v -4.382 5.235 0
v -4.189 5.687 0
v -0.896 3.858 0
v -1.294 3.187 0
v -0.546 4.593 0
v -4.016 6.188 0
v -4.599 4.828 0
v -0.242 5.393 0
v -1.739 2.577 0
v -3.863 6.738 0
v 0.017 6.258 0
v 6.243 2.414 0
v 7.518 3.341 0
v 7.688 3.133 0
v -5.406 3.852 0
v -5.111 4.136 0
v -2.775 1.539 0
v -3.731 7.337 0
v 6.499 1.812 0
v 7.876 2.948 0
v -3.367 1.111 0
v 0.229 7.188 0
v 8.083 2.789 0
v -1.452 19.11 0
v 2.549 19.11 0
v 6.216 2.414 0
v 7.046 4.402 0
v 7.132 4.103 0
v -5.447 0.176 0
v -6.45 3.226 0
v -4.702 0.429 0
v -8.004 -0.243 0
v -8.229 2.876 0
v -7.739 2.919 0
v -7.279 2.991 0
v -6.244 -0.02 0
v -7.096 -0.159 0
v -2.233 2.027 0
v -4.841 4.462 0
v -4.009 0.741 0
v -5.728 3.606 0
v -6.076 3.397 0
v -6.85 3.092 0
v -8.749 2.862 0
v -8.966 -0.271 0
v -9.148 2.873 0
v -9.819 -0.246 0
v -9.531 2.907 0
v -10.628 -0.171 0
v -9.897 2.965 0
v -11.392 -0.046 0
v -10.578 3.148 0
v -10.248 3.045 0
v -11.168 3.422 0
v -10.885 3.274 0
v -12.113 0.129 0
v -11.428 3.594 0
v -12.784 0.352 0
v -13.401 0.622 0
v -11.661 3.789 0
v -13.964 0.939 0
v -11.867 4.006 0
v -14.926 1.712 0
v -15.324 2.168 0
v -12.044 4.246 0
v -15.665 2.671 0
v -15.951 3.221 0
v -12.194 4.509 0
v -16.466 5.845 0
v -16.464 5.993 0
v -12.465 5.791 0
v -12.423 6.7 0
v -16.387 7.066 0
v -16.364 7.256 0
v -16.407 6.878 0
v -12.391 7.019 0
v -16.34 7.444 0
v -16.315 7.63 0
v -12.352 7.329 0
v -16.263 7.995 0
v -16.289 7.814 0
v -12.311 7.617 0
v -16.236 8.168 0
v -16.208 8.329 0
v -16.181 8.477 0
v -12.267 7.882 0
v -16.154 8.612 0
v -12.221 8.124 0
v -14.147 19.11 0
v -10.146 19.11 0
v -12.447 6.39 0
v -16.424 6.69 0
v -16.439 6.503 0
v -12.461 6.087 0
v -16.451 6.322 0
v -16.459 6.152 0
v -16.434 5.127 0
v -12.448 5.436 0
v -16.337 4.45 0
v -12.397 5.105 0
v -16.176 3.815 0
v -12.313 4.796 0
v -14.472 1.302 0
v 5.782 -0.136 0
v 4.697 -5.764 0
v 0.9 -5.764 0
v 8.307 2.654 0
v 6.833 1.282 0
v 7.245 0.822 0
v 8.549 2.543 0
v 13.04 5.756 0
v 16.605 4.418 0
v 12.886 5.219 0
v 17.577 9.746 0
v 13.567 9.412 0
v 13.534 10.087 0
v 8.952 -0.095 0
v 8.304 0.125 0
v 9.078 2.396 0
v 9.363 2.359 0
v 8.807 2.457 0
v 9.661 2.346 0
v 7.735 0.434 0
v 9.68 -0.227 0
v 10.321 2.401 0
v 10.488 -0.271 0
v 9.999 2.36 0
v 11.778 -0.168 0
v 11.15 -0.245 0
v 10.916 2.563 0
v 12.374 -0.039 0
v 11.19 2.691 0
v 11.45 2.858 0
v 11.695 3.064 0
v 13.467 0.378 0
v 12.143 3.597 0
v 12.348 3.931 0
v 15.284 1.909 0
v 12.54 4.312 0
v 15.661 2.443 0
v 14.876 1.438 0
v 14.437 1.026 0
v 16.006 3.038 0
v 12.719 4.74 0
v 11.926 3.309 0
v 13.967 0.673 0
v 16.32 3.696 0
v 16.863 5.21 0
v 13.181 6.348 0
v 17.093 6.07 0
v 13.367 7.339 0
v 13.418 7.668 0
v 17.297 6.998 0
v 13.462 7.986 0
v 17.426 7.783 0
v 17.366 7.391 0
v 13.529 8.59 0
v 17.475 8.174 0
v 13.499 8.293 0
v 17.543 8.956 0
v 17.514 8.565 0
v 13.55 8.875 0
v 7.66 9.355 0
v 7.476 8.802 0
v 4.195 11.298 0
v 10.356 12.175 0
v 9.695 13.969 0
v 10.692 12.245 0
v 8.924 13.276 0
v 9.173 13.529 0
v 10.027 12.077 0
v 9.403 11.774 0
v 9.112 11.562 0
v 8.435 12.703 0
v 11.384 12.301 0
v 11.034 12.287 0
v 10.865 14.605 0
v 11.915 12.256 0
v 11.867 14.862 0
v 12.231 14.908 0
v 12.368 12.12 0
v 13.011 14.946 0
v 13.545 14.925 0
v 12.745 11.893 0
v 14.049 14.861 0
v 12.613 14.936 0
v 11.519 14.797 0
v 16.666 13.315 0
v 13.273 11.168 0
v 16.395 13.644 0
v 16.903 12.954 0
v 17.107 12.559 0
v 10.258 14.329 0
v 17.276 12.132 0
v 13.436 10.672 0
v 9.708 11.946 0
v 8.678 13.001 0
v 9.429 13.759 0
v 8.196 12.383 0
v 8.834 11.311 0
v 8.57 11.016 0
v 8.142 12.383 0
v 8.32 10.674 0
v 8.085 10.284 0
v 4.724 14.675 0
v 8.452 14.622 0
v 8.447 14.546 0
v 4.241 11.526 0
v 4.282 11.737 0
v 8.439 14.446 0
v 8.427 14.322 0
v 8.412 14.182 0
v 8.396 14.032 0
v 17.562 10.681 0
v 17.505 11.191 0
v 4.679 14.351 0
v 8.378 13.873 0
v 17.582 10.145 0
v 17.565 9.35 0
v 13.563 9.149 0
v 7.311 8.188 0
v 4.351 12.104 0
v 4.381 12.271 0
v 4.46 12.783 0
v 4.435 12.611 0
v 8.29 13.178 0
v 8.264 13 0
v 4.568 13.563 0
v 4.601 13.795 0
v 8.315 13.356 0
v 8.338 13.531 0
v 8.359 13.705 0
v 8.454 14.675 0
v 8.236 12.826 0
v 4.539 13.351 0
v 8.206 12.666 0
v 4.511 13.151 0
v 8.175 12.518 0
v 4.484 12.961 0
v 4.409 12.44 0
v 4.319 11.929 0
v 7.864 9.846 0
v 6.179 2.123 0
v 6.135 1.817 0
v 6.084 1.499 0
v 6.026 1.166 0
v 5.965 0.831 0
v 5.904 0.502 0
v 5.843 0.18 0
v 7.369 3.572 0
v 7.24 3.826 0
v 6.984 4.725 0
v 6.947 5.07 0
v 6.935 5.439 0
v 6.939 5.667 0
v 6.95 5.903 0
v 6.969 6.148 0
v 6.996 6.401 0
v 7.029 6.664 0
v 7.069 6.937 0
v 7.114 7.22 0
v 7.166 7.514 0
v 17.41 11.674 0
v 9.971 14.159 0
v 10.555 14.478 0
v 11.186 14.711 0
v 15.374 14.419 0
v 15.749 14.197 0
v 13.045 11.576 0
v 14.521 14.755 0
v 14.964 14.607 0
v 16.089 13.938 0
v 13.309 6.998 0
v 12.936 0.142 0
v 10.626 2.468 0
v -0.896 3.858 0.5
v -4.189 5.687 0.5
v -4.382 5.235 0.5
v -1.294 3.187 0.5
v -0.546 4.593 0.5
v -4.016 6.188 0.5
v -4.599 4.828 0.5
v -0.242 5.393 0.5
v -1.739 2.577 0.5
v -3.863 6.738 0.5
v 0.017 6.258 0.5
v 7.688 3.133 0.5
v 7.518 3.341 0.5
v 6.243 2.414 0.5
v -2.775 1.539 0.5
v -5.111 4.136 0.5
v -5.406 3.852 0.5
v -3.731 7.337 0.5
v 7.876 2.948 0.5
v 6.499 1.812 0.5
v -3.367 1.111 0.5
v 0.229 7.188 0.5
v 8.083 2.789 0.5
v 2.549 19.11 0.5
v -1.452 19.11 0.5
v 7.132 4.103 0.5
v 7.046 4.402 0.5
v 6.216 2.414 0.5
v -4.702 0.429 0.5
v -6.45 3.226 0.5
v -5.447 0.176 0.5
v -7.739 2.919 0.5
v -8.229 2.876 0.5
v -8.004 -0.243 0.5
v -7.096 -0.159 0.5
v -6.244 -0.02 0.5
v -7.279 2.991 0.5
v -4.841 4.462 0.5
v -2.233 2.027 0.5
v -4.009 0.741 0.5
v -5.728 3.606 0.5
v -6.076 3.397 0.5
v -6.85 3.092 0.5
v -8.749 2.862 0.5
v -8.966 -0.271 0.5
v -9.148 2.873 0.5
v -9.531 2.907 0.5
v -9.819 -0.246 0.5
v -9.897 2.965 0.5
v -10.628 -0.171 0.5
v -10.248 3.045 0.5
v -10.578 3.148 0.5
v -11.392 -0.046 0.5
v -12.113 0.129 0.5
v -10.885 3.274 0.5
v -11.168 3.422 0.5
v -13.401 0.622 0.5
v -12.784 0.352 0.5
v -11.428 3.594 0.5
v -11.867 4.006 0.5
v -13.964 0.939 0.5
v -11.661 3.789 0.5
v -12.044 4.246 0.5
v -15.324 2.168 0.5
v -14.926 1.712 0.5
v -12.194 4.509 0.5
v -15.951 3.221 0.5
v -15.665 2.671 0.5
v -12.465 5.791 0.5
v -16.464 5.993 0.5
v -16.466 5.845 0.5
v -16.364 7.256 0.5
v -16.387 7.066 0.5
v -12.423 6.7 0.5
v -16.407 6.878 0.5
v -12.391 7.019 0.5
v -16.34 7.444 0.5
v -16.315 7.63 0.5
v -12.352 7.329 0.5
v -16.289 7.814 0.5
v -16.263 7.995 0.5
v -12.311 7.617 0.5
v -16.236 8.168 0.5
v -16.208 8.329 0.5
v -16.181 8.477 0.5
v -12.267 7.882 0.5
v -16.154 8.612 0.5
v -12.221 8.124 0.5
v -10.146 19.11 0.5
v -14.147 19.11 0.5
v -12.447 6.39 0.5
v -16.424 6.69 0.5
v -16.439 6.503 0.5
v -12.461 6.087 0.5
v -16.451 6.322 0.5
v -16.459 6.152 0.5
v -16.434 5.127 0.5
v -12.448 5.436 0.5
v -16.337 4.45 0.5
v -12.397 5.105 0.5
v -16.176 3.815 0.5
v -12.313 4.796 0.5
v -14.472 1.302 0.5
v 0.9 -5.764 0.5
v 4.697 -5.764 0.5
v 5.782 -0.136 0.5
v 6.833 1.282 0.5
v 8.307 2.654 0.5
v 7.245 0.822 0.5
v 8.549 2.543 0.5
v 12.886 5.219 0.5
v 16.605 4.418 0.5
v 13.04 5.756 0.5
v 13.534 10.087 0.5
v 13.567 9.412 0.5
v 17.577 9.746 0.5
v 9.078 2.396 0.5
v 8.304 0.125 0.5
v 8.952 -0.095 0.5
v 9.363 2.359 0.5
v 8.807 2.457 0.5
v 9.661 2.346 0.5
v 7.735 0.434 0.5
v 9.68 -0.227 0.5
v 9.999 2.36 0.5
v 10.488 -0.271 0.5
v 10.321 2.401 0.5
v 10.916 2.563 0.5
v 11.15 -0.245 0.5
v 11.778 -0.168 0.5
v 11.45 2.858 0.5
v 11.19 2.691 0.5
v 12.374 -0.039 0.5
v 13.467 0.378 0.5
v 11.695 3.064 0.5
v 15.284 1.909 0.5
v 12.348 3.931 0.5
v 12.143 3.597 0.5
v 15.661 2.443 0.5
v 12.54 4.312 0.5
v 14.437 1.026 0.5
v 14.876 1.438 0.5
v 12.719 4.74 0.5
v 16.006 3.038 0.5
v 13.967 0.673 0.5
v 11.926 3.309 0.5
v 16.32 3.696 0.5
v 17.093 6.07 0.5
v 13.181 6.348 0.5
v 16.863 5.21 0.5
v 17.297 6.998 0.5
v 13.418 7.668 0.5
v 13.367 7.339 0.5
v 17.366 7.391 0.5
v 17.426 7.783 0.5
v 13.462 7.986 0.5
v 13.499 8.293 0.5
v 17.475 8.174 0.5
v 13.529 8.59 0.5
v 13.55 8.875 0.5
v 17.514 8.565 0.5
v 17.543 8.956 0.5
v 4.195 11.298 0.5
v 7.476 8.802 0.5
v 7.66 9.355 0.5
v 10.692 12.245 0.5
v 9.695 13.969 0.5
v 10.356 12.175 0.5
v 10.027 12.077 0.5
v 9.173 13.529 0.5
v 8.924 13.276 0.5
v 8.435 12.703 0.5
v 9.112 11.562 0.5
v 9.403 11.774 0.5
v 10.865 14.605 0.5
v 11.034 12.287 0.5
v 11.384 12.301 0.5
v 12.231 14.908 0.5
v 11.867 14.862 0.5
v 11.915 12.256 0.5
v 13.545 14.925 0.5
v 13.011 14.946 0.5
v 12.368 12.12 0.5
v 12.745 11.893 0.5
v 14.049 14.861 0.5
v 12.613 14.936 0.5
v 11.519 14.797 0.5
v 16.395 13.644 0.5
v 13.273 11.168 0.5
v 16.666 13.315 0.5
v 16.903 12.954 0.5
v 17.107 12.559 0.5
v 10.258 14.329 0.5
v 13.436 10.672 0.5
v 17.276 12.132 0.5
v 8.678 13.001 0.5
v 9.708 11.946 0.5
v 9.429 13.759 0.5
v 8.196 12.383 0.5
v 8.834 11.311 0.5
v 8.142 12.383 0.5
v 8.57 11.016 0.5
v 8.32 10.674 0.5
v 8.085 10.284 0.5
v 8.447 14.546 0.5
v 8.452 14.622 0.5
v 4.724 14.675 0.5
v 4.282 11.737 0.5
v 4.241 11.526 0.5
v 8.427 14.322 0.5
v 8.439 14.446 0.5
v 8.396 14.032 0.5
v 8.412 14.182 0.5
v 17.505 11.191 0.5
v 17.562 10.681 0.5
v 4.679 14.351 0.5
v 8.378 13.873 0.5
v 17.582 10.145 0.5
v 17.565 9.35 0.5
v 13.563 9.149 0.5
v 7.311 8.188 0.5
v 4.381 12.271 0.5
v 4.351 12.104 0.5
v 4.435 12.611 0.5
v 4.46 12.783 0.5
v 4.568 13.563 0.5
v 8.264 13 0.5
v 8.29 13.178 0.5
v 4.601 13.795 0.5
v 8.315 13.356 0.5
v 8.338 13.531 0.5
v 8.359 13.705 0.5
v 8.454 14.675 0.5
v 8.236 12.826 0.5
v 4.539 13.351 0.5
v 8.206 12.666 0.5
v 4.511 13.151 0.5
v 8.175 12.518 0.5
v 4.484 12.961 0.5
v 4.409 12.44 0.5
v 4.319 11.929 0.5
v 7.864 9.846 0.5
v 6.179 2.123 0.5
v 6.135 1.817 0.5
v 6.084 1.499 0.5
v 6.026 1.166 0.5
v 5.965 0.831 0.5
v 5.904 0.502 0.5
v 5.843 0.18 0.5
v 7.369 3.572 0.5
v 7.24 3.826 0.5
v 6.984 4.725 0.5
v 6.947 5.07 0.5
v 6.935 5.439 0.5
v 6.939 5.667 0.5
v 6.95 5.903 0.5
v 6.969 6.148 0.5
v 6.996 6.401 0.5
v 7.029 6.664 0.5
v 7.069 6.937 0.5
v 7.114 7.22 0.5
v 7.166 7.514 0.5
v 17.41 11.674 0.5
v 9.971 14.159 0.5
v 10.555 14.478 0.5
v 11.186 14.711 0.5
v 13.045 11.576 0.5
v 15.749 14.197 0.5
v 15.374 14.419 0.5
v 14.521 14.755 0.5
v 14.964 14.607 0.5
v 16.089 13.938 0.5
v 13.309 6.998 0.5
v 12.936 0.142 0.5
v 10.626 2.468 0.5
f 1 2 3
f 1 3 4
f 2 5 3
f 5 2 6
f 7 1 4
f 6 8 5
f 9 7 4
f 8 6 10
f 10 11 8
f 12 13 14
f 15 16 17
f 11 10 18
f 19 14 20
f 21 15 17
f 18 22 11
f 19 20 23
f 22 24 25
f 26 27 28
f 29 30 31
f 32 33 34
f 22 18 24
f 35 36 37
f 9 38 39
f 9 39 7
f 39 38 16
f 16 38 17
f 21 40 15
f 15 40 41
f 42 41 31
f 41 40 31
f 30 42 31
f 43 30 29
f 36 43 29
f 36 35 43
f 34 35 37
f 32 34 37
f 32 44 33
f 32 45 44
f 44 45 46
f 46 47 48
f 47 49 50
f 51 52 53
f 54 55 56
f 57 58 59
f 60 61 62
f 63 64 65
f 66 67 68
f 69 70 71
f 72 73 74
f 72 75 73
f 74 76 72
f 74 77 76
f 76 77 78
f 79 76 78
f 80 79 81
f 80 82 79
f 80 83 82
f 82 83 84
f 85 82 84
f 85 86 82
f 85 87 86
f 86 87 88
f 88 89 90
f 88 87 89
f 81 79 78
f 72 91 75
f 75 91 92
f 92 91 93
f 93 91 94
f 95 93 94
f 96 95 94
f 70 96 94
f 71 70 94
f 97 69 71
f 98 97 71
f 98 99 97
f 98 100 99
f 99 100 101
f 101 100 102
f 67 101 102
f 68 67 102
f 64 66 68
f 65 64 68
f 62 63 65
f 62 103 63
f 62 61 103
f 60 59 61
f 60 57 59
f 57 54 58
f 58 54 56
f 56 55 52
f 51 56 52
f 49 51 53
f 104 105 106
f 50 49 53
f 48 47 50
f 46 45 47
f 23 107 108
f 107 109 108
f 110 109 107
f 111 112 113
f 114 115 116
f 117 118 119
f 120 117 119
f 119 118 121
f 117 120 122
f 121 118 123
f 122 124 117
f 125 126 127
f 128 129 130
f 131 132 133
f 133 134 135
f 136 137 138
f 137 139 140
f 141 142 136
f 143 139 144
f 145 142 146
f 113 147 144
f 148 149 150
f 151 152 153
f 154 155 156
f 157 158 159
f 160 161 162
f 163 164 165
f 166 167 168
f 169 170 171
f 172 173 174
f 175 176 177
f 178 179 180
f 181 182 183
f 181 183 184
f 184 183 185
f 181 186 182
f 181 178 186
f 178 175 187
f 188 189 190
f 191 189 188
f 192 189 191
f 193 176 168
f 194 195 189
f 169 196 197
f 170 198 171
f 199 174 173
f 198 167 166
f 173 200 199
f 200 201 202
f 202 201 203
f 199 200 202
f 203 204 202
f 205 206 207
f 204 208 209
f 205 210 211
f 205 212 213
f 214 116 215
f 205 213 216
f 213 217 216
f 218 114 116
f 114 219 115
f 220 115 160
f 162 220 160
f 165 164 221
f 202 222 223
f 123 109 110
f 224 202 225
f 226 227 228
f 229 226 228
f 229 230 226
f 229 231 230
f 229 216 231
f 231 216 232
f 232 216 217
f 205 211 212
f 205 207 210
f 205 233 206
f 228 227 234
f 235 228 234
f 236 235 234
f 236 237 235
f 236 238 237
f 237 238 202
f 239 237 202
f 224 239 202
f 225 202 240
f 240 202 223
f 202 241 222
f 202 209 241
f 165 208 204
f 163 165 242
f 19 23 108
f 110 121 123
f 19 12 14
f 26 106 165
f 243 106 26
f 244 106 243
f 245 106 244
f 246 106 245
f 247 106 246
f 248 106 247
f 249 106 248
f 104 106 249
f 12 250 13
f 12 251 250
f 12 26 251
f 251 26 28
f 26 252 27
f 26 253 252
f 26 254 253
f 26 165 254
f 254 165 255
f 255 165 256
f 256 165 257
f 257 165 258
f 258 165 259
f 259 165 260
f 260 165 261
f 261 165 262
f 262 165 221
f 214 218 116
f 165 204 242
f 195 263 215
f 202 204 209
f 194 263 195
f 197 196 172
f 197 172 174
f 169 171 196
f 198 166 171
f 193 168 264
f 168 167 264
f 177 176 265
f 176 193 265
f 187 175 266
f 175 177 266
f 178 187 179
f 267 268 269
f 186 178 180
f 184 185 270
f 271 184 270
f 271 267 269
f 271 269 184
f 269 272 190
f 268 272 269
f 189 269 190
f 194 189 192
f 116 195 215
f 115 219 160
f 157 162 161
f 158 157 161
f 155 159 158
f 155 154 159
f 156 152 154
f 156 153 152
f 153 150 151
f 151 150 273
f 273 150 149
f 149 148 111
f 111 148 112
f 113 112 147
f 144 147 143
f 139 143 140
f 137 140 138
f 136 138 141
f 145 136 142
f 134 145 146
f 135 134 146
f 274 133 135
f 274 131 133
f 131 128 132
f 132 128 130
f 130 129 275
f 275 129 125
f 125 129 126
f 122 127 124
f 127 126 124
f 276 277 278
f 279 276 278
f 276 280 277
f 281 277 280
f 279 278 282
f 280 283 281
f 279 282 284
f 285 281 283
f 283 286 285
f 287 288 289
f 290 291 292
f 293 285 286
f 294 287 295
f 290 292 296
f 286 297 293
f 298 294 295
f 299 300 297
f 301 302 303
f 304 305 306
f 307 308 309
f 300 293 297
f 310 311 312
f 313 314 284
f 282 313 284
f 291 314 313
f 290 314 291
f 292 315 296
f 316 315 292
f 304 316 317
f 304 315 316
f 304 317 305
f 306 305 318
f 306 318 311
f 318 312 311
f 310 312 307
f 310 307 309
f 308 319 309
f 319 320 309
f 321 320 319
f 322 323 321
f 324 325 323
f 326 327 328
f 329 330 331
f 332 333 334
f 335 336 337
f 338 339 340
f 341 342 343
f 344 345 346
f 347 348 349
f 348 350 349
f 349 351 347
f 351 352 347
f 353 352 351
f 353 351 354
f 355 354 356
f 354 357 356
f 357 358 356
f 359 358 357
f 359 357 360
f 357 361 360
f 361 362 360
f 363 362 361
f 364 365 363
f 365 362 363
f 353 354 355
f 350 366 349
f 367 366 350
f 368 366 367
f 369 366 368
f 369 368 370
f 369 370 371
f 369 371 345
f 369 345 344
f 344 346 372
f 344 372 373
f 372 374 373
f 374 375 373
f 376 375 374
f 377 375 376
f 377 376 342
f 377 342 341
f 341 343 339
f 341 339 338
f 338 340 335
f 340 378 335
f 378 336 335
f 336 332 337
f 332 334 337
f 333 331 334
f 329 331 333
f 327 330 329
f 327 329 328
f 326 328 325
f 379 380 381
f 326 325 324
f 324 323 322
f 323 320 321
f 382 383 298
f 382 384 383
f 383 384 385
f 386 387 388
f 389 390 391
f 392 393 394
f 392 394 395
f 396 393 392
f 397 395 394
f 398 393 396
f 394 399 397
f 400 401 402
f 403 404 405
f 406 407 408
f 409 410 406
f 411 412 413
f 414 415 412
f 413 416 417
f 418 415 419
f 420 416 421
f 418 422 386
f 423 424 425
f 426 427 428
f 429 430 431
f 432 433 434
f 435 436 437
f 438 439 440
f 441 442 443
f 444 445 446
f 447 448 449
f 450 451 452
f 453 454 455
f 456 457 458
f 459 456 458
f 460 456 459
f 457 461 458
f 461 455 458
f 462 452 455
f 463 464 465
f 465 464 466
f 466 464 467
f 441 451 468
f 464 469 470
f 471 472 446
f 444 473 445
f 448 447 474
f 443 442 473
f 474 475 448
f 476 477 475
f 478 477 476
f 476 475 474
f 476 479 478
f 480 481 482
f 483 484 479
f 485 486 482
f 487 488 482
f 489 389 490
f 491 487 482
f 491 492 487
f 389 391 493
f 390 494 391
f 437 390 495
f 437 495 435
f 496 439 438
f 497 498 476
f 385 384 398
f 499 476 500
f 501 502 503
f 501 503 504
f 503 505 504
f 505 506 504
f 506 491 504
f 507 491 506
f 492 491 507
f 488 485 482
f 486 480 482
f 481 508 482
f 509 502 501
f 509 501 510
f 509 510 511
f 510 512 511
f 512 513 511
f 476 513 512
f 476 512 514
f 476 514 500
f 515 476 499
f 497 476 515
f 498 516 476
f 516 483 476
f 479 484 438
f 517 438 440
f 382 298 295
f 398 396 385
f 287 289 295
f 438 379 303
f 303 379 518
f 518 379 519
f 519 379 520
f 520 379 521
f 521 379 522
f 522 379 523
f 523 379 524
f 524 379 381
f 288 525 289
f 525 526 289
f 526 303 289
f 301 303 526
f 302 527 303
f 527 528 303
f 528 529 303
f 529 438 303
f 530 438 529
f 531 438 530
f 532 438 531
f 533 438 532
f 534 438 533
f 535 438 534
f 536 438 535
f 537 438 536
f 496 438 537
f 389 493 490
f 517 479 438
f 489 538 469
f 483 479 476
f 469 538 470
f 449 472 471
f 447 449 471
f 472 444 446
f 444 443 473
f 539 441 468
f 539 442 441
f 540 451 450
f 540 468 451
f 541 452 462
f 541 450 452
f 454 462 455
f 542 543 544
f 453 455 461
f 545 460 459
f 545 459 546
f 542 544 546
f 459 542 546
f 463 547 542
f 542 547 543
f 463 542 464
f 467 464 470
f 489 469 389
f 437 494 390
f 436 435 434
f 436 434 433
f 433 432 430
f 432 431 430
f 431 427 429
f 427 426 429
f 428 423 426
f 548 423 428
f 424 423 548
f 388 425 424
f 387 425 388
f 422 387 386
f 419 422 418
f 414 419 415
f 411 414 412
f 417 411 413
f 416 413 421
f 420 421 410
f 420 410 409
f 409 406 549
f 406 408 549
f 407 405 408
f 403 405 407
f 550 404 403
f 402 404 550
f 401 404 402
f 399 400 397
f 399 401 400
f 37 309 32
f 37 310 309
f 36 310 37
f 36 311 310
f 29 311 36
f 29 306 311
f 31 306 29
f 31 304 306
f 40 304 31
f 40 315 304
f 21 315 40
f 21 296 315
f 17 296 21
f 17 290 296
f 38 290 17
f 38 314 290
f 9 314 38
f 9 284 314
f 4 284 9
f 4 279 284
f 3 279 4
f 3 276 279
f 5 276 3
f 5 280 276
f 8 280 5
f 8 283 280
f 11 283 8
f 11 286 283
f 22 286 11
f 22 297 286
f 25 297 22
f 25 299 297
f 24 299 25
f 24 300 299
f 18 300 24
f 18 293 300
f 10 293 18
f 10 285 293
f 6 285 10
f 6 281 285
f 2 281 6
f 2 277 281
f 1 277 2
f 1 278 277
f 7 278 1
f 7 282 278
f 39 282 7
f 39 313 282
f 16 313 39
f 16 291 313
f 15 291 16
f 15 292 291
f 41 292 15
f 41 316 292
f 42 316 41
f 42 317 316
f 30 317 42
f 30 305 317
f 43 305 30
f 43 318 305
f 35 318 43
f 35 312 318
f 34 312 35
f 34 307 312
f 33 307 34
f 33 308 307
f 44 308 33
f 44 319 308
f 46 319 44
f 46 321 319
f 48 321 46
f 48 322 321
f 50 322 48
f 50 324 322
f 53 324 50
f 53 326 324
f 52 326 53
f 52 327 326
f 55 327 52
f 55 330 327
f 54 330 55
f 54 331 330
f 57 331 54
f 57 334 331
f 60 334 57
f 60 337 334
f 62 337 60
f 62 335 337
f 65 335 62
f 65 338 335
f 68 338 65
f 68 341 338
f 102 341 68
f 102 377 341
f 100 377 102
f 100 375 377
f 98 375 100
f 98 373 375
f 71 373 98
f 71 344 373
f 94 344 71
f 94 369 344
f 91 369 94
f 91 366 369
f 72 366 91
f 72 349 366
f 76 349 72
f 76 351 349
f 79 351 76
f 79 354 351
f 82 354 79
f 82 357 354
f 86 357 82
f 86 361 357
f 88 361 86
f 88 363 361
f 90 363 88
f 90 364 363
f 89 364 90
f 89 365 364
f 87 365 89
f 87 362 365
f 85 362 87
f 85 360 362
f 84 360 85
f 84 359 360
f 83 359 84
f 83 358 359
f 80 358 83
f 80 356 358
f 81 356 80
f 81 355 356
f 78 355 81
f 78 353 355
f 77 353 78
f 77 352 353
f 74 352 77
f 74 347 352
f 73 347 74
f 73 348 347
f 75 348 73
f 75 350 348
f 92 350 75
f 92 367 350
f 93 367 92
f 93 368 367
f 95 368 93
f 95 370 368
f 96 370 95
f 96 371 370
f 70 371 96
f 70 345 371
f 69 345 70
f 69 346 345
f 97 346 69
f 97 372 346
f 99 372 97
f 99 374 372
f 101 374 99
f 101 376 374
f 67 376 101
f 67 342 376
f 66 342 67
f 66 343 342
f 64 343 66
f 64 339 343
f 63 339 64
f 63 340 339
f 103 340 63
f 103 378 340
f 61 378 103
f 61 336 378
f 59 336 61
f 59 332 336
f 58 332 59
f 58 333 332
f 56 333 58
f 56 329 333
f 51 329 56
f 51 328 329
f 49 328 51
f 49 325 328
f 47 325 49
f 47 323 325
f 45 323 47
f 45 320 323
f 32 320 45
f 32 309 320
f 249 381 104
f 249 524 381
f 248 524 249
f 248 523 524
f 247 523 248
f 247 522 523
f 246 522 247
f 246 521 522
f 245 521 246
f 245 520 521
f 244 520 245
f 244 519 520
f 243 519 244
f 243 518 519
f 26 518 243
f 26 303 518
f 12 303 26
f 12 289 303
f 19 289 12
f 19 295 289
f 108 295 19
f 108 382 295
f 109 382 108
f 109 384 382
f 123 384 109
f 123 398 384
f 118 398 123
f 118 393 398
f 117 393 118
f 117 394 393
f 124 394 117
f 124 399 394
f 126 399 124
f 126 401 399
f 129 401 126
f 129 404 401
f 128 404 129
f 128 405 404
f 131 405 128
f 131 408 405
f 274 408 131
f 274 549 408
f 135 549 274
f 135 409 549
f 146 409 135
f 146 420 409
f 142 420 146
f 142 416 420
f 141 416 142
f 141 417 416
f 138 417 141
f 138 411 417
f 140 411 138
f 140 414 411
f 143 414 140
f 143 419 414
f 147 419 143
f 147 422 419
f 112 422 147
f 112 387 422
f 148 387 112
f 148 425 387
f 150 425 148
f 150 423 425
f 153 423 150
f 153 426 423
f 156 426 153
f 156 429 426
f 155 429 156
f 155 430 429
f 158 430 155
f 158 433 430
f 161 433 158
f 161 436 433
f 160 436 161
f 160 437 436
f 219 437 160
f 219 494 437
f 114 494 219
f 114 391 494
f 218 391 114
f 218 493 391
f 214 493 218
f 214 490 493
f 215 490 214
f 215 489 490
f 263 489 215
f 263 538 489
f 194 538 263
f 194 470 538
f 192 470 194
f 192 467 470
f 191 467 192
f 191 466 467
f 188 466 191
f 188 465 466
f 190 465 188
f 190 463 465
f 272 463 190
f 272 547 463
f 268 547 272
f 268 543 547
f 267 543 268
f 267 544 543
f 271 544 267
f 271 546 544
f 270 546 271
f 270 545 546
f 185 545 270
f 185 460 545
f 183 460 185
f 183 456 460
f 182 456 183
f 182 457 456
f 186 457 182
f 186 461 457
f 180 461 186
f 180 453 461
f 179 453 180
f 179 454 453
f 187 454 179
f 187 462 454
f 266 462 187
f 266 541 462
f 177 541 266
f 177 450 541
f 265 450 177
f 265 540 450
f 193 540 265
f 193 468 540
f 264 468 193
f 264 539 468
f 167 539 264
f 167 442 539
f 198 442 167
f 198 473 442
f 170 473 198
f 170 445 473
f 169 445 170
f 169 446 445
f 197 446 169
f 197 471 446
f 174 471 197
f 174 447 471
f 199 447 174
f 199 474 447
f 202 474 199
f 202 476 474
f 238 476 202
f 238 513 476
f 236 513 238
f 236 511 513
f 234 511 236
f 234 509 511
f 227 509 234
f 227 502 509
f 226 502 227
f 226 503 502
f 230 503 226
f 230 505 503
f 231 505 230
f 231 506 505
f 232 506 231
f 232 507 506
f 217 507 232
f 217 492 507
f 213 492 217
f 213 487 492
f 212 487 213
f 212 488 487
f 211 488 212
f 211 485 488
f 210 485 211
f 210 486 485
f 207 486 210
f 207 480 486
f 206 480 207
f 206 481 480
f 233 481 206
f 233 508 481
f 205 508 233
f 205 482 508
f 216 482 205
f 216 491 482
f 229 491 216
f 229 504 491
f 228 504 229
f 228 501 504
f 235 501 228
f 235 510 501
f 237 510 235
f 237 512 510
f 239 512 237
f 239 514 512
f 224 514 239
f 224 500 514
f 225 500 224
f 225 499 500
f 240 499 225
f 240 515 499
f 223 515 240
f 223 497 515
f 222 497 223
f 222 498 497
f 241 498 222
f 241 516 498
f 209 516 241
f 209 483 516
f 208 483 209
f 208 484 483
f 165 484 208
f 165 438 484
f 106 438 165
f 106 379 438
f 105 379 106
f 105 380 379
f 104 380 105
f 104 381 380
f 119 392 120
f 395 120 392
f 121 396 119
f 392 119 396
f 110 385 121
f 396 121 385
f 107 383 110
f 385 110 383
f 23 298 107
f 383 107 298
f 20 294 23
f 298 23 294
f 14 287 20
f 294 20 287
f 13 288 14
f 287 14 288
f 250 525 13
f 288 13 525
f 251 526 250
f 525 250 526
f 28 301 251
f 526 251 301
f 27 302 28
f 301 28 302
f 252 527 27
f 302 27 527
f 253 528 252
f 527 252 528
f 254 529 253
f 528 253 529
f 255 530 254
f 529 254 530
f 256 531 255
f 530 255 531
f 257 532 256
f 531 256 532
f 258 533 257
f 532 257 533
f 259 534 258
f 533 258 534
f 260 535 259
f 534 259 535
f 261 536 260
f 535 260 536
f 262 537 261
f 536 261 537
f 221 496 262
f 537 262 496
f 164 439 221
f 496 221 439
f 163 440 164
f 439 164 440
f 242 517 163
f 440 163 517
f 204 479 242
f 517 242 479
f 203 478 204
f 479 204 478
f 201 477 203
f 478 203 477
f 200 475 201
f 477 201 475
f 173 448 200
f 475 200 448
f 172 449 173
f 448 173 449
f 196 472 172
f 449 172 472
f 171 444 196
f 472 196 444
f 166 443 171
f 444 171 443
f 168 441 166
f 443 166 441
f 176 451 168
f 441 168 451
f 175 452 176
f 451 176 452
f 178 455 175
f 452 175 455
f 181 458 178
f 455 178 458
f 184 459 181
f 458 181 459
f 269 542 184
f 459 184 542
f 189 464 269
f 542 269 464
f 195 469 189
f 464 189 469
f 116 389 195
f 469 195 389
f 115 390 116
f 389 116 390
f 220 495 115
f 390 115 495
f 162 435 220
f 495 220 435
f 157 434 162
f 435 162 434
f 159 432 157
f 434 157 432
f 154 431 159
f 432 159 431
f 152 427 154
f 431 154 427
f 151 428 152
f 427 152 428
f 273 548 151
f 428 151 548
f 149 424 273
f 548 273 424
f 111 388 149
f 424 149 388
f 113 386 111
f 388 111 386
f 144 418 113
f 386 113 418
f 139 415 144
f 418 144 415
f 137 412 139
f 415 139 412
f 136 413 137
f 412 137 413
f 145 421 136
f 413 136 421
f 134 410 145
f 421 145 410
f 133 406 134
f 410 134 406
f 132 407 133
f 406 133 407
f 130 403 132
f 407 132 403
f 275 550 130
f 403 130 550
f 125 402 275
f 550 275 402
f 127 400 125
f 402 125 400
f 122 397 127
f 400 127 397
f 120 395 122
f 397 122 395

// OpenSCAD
font = "Liberation Sans:style=Bold Italic";
linear_extrude(height = 0.5) {
    text("Up",
    font = font, 
    size = 20, 
    halign = "center");
}
